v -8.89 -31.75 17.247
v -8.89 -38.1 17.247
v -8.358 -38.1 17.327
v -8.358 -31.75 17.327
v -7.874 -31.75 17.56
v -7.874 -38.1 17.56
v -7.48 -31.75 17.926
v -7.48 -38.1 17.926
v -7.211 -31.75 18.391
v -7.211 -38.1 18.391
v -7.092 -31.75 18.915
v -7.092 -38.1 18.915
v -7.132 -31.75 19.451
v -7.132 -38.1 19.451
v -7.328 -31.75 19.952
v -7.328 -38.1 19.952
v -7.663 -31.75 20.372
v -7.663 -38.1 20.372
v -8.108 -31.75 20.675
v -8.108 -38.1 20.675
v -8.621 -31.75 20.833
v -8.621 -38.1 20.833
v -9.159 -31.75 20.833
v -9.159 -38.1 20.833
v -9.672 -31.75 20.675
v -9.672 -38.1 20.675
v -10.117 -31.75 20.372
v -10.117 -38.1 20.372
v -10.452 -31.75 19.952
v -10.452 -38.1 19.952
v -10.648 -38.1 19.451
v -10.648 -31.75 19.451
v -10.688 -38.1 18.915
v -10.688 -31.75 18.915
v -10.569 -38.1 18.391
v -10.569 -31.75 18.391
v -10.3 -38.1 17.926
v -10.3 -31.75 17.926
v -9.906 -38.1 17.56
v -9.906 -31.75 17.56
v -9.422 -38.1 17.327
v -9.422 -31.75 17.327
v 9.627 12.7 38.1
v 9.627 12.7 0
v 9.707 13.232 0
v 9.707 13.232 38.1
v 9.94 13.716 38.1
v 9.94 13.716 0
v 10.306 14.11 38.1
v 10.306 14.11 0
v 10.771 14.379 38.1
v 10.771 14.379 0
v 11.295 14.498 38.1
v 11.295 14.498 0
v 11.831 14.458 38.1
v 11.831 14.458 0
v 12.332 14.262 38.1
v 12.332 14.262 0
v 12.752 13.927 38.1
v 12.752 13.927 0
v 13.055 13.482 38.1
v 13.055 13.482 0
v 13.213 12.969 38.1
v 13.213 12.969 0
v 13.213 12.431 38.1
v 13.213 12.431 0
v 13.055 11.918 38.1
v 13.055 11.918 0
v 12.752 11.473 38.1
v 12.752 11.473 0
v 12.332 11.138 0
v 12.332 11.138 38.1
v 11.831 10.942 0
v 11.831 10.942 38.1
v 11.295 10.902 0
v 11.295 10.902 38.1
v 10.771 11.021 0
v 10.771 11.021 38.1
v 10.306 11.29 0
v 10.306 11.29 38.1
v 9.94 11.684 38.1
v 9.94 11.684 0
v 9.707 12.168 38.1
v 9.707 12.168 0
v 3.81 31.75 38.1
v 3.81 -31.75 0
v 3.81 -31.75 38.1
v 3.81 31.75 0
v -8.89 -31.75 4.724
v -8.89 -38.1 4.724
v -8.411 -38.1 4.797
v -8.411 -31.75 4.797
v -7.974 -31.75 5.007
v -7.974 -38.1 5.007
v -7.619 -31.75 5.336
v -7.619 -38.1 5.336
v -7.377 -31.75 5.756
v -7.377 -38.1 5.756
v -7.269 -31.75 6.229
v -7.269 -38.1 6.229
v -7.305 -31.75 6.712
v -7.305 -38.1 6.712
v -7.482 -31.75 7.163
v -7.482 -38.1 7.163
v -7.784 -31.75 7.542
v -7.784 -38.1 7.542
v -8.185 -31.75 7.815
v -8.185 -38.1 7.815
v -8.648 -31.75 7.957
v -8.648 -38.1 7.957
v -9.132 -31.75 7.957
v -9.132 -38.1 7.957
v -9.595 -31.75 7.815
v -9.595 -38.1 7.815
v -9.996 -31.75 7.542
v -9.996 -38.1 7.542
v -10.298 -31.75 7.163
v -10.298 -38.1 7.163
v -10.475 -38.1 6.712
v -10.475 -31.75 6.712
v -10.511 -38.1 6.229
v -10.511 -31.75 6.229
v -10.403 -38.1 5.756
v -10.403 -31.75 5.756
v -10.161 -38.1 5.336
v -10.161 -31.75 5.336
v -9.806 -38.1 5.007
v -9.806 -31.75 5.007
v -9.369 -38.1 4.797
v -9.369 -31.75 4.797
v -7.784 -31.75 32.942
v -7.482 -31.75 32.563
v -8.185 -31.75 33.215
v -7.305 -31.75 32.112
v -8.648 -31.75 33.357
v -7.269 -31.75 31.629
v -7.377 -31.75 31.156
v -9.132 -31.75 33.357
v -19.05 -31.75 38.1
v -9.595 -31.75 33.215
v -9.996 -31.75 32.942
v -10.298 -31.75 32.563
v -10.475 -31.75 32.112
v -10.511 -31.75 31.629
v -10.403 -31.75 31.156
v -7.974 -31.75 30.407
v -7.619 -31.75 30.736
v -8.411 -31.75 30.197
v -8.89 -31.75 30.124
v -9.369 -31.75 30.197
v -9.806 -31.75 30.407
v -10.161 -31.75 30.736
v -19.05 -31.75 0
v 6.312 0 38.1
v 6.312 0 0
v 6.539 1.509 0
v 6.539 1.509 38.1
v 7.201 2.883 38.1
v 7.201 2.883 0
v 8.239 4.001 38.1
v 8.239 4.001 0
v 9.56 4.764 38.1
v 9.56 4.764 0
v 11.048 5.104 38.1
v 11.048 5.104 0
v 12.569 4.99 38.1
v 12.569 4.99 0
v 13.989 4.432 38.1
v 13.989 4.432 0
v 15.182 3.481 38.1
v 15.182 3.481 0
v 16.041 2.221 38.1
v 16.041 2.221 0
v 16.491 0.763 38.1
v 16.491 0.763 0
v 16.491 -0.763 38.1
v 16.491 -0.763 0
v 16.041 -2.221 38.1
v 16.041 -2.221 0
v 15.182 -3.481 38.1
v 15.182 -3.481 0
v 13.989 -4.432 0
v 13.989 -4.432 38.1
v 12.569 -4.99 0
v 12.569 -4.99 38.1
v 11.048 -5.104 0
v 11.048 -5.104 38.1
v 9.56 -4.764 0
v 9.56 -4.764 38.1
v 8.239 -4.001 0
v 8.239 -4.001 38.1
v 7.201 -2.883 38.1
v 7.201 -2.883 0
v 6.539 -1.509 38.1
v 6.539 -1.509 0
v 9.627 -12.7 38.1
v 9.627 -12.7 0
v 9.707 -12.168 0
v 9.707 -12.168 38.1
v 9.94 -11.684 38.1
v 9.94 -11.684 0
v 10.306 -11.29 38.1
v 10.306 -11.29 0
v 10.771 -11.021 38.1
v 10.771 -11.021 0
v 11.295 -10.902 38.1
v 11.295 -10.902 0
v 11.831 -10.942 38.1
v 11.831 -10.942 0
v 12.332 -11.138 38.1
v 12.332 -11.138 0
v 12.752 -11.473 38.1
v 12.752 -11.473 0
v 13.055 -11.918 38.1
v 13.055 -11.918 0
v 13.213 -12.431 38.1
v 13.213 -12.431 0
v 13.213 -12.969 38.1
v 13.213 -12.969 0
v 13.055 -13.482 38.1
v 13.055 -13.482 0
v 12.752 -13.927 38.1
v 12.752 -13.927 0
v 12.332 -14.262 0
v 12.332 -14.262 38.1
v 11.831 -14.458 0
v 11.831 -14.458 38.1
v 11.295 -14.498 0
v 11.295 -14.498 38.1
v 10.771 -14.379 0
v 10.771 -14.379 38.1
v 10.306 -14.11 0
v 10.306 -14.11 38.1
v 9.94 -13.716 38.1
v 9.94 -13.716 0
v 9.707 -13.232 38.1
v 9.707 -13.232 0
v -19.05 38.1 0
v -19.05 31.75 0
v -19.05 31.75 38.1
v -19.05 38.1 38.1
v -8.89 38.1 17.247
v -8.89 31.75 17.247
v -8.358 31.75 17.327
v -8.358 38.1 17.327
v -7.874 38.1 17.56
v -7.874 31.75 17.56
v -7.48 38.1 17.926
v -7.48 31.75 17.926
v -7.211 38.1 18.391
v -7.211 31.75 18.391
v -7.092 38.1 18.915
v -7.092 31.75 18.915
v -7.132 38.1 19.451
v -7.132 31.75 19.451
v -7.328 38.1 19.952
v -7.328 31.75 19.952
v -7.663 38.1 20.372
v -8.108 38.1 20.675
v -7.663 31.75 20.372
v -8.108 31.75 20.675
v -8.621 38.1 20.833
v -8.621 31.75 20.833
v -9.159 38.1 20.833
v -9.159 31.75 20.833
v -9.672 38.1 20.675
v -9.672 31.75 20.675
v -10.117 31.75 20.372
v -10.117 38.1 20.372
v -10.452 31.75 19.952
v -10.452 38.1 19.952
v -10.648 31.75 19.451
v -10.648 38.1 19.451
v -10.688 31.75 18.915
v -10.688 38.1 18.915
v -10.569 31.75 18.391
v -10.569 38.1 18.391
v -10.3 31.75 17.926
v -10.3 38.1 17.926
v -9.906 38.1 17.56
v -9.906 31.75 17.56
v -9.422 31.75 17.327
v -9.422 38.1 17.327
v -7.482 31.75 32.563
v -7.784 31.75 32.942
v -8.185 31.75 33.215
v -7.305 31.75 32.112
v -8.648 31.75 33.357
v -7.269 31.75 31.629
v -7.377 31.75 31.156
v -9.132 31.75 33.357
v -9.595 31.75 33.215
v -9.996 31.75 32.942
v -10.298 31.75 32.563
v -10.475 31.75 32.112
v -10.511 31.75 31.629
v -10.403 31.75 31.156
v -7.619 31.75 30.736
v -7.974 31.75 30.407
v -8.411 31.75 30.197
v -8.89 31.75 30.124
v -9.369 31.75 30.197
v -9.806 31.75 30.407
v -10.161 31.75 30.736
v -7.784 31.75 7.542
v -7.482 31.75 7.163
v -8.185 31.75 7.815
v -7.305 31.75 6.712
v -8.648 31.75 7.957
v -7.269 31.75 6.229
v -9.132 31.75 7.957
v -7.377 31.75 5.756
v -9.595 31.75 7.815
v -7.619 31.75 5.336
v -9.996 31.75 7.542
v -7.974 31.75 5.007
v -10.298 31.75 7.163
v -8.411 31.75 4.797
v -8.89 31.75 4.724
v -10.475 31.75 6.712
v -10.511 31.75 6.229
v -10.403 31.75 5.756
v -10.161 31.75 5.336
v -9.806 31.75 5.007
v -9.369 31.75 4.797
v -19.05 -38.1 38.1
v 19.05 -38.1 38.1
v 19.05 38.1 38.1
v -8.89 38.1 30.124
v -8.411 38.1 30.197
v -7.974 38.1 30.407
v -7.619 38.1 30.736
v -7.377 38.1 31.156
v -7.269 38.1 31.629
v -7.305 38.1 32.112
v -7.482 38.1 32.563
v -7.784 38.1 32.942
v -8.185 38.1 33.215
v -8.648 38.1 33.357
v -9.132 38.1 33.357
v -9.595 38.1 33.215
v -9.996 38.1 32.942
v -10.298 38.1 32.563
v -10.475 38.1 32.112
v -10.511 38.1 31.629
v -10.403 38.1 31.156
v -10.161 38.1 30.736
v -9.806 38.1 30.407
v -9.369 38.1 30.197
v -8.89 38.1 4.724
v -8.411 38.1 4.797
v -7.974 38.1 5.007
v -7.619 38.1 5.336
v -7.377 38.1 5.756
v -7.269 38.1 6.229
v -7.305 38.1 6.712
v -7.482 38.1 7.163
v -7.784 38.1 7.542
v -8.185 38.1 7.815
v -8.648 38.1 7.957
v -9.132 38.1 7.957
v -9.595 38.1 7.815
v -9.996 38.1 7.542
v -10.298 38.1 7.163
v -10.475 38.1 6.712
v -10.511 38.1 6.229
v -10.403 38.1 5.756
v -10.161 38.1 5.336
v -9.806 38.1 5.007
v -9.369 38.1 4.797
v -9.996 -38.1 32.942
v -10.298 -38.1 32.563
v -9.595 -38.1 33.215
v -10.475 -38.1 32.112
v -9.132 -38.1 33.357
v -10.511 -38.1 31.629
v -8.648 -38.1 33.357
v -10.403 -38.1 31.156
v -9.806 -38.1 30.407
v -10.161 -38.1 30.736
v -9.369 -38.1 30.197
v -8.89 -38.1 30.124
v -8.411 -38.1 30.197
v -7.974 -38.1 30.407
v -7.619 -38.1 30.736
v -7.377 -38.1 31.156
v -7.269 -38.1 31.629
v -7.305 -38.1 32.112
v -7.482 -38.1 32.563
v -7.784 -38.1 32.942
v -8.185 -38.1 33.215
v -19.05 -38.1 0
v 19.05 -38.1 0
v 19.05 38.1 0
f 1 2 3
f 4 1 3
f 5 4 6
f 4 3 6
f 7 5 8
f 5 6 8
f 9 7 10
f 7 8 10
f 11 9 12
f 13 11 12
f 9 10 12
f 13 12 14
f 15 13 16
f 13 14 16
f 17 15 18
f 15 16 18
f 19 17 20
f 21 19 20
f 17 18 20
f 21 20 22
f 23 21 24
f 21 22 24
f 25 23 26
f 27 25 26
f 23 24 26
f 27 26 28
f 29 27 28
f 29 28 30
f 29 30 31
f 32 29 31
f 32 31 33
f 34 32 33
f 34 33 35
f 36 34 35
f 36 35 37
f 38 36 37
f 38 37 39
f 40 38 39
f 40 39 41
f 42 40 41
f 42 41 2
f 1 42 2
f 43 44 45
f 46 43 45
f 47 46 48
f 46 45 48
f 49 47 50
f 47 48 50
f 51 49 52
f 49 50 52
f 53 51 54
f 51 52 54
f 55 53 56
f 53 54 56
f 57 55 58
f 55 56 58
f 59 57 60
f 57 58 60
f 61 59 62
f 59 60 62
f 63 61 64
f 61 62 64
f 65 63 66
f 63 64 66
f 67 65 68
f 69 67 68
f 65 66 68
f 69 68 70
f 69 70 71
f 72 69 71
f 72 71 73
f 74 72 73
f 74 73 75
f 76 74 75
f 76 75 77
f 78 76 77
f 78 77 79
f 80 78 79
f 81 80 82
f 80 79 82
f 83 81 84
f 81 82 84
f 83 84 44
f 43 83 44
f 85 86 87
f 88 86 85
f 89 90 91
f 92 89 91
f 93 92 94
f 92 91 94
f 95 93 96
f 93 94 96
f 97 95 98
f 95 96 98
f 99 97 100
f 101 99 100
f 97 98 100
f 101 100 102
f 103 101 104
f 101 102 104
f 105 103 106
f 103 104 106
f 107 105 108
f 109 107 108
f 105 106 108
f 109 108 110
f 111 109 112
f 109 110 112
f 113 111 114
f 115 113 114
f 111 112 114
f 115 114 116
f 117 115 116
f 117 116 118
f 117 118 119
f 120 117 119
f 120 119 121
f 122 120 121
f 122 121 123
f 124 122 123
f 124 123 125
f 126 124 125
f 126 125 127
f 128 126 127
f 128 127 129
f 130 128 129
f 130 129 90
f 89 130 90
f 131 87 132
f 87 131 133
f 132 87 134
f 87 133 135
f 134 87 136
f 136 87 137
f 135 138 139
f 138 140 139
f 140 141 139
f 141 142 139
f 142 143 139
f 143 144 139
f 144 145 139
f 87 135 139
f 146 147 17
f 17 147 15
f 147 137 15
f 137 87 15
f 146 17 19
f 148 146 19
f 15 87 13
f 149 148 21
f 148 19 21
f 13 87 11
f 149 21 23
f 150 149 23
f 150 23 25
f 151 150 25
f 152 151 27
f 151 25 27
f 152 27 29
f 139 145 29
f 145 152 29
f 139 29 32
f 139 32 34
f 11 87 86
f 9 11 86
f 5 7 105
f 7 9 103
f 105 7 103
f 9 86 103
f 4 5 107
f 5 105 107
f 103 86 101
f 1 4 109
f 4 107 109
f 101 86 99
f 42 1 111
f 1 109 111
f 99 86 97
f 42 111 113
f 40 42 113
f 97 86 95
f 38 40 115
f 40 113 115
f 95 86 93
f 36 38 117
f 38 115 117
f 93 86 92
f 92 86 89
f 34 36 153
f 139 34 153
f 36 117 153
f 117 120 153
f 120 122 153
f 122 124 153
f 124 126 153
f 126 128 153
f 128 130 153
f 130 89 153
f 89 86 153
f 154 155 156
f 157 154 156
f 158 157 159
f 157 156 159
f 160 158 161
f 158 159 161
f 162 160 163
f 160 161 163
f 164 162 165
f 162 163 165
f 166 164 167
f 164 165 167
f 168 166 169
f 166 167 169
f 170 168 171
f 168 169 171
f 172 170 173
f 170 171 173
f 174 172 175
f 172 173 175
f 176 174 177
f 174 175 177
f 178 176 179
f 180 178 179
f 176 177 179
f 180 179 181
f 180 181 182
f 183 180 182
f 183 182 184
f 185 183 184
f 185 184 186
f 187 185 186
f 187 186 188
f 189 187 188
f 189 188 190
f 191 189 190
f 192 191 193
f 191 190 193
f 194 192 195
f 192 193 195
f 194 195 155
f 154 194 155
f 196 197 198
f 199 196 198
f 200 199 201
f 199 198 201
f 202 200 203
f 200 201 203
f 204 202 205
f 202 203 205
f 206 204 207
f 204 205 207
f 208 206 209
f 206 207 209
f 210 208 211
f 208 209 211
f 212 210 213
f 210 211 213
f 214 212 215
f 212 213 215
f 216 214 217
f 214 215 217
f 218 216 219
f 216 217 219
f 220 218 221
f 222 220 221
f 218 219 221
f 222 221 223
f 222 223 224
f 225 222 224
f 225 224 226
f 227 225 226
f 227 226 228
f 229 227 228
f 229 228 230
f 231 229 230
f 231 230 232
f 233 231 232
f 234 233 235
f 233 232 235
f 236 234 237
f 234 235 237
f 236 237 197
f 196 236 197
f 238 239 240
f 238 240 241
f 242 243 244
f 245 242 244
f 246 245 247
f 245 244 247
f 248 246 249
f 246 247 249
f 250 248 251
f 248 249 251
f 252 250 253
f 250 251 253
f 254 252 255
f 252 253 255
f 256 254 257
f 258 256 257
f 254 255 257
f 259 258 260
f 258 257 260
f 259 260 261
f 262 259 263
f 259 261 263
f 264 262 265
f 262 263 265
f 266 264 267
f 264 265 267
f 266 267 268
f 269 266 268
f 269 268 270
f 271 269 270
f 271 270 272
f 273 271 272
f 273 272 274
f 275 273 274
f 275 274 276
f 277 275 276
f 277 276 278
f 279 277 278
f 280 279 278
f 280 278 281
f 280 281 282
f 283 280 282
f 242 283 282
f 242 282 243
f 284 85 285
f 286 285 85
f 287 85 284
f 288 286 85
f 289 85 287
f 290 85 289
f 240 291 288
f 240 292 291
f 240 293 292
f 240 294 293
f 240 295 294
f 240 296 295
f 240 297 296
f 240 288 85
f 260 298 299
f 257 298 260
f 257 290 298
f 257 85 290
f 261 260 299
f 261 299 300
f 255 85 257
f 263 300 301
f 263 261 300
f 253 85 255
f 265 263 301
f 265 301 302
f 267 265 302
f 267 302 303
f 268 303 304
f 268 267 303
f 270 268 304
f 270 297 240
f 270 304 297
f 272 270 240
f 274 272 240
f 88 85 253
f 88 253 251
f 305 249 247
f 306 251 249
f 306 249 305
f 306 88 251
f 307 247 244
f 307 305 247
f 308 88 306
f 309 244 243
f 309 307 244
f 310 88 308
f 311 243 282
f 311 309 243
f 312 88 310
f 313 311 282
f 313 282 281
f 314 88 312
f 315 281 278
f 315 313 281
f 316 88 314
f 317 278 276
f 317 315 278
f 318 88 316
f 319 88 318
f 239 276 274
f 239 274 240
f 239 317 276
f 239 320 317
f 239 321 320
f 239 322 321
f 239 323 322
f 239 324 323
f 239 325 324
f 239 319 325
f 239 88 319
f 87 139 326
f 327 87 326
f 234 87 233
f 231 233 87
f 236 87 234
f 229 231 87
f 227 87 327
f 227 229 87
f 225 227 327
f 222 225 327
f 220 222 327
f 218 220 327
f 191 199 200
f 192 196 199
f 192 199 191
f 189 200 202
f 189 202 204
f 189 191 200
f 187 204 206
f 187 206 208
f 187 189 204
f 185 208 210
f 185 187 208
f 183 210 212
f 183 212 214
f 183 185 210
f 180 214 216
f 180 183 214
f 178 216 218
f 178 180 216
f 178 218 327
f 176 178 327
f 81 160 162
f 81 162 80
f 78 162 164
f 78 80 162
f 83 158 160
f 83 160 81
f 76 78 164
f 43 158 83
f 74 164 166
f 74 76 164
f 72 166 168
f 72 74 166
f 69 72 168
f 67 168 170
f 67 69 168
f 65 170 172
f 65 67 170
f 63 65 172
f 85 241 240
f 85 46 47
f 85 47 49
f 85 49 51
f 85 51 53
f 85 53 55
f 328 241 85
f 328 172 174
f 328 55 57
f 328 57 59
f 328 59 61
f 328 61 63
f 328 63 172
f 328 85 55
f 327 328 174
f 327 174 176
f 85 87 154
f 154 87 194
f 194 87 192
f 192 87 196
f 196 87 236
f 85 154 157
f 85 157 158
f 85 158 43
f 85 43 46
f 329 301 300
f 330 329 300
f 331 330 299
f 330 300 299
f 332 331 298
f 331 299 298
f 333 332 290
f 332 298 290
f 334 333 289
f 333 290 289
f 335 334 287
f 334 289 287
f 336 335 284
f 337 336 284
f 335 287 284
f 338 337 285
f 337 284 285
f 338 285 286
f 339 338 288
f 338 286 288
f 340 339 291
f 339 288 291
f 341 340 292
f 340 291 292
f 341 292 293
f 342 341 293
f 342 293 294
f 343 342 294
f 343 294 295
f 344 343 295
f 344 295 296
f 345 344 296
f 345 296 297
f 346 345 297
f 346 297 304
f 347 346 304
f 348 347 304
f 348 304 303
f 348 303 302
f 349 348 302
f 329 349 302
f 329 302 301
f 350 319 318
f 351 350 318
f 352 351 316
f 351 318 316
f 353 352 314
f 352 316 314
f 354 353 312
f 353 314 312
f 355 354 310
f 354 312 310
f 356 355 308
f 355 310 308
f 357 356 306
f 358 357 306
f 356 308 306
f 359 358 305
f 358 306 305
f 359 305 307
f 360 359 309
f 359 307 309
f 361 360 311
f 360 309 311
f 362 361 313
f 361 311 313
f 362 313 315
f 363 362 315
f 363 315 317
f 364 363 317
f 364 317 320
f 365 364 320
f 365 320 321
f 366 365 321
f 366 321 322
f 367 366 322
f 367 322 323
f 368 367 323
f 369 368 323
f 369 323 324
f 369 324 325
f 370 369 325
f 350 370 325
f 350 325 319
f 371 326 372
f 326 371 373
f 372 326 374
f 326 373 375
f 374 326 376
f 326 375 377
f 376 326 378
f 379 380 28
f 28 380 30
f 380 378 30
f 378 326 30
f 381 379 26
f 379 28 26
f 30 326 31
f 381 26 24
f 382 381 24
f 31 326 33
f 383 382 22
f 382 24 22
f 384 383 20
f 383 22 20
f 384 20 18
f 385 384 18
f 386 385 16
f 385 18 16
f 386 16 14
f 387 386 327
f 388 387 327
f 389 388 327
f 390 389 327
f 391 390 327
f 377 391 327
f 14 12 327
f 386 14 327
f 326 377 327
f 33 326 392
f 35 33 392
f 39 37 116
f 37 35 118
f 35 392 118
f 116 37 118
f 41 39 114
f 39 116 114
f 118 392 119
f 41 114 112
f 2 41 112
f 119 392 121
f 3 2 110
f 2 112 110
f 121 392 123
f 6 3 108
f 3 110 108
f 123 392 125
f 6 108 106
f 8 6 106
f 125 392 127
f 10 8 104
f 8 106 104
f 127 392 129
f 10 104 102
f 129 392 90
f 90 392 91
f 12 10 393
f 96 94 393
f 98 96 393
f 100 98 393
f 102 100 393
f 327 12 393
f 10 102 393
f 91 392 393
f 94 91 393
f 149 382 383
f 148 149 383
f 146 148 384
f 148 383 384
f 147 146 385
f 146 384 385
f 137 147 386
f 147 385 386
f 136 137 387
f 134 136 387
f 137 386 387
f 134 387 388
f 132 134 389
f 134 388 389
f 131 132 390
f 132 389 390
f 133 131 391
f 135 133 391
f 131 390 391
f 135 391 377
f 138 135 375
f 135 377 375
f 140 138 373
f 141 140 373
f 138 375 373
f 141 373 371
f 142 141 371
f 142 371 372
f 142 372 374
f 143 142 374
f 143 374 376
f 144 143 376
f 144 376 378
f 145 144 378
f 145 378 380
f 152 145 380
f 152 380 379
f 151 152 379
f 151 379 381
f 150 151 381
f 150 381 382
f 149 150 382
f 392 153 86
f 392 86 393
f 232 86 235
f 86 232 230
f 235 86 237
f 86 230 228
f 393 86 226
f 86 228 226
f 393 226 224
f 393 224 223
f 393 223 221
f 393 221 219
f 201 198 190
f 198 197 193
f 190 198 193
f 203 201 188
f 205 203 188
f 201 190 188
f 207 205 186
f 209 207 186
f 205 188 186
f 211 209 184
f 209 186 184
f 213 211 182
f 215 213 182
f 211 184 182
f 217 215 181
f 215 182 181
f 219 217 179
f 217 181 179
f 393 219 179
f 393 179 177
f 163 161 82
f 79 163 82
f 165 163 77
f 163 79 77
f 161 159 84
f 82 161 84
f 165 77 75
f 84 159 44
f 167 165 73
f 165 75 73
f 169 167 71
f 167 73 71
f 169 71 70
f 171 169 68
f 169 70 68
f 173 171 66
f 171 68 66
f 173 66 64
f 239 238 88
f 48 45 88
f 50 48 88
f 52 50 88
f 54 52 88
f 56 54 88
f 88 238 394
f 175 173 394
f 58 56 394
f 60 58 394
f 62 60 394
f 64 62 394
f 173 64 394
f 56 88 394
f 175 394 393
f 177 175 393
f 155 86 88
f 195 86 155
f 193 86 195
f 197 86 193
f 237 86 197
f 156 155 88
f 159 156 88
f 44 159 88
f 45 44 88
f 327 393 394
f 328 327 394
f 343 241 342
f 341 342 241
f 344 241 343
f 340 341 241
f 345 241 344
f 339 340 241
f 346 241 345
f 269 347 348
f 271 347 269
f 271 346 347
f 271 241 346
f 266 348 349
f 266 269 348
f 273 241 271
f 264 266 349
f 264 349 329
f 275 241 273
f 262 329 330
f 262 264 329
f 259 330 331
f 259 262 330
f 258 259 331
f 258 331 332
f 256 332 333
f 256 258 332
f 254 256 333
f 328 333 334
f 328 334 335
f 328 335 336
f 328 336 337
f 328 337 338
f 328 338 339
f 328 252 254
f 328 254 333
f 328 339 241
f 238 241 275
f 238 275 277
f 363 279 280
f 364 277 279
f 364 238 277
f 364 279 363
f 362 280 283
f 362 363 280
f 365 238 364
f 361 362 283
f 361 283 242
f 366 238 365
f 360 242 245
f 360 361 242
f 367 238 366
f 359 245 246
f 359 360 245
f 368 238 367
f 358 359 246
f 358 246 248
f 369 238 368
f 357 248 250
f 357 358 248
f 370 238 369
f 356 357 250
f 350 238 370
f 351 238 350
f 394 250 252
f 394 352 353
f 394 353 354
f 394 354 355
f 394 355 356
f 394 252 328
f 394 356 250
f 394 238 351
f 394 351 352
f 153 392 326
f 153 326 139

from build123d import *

# Parameters (mm, degrees)
SKETCH1_W           = 38.1
SKETCH1_H           = 76.2
BOSS_EXTRUDE1_DEPTH = 38.1
SKETCH2_W           = 22.86
SKETCH2_H           = 63.5
CUT_EXTRUDE1_DEPTH  = 38.1
SKETCH3_R           = 5.1181
SKETCH3_R_2         = 1.8034
CUT_EXTRUDE2_DEPTH  = 38.1
SKETCH4_R           = 1.6256
SKETCH4_R_2         = 1.8034
CUT_EXTRUDE3_DEPTH  = 76.2


with BuildPart() as part:
    # Sketch1 → Boss-Extrude1 (new body)
    with BuildSketch(Plane.XY):
        Rectangle(SKETCH1_W, SKETCH1_H)
    extrude(amount=BOSS_EXTRUDE1_DEPTH)

    # Sketch2 → Cut-Extrude1 (cut)
    with BuildSketch(Plane(origin=(0, 0, 0), x_dir=(-1, 0, 0), z_dir=(0, 0, -1))):
        with Locations((7.62, 0)):
            Rectangle(SKETCH2_W, SKETCH2_H)
    extrude(amount=-CUT_EXTRUDE1_DEPTH, mode=Mode.SUBTRACT)

    # Sketch3 → Cut-Extrude2 (cut)
    with BuildSketch(Plane(origin=(0, 0, 0), x_dir=(-1, 0, 0), z_dir=(0, 0, -1))):
        with Locations((-11.43, 0)):
            Circle(SKETCH3_R)
        with Locations((-11.43, -12.7)):
            Circle(SKETCH3_R_2)
        with Locations((-11.43, 12.7)):
            Circle(SKETCH3_R_2)
    extrude(amount=-CUT_EXTRUDE2_DEPTH, mode=Mode.SUBTRACT)

    # Sketch4 → Cut-Extrude3 (cut)
    with BuildSketch(Plane(origin=(0, -38.1, 0), x_dir=(-1, 0, 0), z_dir=(0, -1, 0))):
        with Locations(Location((8.89, -6.35, 0), (0, 0, 90))):
            Circle(SKETCH4_R)
        with Locations(Location((8.89, -19.05, 0), (0, 0, 90))):
            Circle(SKETCH4_R_2)
        with Locations(Location((8.89, -31.75, 0), (0, 0, 90))):
            Circle(SKETCH4_R)
    extrude(amount=-CUT_EXTRUDE3_DEPTH, mode=Mode.SUBTRACT)


solid = part.part
